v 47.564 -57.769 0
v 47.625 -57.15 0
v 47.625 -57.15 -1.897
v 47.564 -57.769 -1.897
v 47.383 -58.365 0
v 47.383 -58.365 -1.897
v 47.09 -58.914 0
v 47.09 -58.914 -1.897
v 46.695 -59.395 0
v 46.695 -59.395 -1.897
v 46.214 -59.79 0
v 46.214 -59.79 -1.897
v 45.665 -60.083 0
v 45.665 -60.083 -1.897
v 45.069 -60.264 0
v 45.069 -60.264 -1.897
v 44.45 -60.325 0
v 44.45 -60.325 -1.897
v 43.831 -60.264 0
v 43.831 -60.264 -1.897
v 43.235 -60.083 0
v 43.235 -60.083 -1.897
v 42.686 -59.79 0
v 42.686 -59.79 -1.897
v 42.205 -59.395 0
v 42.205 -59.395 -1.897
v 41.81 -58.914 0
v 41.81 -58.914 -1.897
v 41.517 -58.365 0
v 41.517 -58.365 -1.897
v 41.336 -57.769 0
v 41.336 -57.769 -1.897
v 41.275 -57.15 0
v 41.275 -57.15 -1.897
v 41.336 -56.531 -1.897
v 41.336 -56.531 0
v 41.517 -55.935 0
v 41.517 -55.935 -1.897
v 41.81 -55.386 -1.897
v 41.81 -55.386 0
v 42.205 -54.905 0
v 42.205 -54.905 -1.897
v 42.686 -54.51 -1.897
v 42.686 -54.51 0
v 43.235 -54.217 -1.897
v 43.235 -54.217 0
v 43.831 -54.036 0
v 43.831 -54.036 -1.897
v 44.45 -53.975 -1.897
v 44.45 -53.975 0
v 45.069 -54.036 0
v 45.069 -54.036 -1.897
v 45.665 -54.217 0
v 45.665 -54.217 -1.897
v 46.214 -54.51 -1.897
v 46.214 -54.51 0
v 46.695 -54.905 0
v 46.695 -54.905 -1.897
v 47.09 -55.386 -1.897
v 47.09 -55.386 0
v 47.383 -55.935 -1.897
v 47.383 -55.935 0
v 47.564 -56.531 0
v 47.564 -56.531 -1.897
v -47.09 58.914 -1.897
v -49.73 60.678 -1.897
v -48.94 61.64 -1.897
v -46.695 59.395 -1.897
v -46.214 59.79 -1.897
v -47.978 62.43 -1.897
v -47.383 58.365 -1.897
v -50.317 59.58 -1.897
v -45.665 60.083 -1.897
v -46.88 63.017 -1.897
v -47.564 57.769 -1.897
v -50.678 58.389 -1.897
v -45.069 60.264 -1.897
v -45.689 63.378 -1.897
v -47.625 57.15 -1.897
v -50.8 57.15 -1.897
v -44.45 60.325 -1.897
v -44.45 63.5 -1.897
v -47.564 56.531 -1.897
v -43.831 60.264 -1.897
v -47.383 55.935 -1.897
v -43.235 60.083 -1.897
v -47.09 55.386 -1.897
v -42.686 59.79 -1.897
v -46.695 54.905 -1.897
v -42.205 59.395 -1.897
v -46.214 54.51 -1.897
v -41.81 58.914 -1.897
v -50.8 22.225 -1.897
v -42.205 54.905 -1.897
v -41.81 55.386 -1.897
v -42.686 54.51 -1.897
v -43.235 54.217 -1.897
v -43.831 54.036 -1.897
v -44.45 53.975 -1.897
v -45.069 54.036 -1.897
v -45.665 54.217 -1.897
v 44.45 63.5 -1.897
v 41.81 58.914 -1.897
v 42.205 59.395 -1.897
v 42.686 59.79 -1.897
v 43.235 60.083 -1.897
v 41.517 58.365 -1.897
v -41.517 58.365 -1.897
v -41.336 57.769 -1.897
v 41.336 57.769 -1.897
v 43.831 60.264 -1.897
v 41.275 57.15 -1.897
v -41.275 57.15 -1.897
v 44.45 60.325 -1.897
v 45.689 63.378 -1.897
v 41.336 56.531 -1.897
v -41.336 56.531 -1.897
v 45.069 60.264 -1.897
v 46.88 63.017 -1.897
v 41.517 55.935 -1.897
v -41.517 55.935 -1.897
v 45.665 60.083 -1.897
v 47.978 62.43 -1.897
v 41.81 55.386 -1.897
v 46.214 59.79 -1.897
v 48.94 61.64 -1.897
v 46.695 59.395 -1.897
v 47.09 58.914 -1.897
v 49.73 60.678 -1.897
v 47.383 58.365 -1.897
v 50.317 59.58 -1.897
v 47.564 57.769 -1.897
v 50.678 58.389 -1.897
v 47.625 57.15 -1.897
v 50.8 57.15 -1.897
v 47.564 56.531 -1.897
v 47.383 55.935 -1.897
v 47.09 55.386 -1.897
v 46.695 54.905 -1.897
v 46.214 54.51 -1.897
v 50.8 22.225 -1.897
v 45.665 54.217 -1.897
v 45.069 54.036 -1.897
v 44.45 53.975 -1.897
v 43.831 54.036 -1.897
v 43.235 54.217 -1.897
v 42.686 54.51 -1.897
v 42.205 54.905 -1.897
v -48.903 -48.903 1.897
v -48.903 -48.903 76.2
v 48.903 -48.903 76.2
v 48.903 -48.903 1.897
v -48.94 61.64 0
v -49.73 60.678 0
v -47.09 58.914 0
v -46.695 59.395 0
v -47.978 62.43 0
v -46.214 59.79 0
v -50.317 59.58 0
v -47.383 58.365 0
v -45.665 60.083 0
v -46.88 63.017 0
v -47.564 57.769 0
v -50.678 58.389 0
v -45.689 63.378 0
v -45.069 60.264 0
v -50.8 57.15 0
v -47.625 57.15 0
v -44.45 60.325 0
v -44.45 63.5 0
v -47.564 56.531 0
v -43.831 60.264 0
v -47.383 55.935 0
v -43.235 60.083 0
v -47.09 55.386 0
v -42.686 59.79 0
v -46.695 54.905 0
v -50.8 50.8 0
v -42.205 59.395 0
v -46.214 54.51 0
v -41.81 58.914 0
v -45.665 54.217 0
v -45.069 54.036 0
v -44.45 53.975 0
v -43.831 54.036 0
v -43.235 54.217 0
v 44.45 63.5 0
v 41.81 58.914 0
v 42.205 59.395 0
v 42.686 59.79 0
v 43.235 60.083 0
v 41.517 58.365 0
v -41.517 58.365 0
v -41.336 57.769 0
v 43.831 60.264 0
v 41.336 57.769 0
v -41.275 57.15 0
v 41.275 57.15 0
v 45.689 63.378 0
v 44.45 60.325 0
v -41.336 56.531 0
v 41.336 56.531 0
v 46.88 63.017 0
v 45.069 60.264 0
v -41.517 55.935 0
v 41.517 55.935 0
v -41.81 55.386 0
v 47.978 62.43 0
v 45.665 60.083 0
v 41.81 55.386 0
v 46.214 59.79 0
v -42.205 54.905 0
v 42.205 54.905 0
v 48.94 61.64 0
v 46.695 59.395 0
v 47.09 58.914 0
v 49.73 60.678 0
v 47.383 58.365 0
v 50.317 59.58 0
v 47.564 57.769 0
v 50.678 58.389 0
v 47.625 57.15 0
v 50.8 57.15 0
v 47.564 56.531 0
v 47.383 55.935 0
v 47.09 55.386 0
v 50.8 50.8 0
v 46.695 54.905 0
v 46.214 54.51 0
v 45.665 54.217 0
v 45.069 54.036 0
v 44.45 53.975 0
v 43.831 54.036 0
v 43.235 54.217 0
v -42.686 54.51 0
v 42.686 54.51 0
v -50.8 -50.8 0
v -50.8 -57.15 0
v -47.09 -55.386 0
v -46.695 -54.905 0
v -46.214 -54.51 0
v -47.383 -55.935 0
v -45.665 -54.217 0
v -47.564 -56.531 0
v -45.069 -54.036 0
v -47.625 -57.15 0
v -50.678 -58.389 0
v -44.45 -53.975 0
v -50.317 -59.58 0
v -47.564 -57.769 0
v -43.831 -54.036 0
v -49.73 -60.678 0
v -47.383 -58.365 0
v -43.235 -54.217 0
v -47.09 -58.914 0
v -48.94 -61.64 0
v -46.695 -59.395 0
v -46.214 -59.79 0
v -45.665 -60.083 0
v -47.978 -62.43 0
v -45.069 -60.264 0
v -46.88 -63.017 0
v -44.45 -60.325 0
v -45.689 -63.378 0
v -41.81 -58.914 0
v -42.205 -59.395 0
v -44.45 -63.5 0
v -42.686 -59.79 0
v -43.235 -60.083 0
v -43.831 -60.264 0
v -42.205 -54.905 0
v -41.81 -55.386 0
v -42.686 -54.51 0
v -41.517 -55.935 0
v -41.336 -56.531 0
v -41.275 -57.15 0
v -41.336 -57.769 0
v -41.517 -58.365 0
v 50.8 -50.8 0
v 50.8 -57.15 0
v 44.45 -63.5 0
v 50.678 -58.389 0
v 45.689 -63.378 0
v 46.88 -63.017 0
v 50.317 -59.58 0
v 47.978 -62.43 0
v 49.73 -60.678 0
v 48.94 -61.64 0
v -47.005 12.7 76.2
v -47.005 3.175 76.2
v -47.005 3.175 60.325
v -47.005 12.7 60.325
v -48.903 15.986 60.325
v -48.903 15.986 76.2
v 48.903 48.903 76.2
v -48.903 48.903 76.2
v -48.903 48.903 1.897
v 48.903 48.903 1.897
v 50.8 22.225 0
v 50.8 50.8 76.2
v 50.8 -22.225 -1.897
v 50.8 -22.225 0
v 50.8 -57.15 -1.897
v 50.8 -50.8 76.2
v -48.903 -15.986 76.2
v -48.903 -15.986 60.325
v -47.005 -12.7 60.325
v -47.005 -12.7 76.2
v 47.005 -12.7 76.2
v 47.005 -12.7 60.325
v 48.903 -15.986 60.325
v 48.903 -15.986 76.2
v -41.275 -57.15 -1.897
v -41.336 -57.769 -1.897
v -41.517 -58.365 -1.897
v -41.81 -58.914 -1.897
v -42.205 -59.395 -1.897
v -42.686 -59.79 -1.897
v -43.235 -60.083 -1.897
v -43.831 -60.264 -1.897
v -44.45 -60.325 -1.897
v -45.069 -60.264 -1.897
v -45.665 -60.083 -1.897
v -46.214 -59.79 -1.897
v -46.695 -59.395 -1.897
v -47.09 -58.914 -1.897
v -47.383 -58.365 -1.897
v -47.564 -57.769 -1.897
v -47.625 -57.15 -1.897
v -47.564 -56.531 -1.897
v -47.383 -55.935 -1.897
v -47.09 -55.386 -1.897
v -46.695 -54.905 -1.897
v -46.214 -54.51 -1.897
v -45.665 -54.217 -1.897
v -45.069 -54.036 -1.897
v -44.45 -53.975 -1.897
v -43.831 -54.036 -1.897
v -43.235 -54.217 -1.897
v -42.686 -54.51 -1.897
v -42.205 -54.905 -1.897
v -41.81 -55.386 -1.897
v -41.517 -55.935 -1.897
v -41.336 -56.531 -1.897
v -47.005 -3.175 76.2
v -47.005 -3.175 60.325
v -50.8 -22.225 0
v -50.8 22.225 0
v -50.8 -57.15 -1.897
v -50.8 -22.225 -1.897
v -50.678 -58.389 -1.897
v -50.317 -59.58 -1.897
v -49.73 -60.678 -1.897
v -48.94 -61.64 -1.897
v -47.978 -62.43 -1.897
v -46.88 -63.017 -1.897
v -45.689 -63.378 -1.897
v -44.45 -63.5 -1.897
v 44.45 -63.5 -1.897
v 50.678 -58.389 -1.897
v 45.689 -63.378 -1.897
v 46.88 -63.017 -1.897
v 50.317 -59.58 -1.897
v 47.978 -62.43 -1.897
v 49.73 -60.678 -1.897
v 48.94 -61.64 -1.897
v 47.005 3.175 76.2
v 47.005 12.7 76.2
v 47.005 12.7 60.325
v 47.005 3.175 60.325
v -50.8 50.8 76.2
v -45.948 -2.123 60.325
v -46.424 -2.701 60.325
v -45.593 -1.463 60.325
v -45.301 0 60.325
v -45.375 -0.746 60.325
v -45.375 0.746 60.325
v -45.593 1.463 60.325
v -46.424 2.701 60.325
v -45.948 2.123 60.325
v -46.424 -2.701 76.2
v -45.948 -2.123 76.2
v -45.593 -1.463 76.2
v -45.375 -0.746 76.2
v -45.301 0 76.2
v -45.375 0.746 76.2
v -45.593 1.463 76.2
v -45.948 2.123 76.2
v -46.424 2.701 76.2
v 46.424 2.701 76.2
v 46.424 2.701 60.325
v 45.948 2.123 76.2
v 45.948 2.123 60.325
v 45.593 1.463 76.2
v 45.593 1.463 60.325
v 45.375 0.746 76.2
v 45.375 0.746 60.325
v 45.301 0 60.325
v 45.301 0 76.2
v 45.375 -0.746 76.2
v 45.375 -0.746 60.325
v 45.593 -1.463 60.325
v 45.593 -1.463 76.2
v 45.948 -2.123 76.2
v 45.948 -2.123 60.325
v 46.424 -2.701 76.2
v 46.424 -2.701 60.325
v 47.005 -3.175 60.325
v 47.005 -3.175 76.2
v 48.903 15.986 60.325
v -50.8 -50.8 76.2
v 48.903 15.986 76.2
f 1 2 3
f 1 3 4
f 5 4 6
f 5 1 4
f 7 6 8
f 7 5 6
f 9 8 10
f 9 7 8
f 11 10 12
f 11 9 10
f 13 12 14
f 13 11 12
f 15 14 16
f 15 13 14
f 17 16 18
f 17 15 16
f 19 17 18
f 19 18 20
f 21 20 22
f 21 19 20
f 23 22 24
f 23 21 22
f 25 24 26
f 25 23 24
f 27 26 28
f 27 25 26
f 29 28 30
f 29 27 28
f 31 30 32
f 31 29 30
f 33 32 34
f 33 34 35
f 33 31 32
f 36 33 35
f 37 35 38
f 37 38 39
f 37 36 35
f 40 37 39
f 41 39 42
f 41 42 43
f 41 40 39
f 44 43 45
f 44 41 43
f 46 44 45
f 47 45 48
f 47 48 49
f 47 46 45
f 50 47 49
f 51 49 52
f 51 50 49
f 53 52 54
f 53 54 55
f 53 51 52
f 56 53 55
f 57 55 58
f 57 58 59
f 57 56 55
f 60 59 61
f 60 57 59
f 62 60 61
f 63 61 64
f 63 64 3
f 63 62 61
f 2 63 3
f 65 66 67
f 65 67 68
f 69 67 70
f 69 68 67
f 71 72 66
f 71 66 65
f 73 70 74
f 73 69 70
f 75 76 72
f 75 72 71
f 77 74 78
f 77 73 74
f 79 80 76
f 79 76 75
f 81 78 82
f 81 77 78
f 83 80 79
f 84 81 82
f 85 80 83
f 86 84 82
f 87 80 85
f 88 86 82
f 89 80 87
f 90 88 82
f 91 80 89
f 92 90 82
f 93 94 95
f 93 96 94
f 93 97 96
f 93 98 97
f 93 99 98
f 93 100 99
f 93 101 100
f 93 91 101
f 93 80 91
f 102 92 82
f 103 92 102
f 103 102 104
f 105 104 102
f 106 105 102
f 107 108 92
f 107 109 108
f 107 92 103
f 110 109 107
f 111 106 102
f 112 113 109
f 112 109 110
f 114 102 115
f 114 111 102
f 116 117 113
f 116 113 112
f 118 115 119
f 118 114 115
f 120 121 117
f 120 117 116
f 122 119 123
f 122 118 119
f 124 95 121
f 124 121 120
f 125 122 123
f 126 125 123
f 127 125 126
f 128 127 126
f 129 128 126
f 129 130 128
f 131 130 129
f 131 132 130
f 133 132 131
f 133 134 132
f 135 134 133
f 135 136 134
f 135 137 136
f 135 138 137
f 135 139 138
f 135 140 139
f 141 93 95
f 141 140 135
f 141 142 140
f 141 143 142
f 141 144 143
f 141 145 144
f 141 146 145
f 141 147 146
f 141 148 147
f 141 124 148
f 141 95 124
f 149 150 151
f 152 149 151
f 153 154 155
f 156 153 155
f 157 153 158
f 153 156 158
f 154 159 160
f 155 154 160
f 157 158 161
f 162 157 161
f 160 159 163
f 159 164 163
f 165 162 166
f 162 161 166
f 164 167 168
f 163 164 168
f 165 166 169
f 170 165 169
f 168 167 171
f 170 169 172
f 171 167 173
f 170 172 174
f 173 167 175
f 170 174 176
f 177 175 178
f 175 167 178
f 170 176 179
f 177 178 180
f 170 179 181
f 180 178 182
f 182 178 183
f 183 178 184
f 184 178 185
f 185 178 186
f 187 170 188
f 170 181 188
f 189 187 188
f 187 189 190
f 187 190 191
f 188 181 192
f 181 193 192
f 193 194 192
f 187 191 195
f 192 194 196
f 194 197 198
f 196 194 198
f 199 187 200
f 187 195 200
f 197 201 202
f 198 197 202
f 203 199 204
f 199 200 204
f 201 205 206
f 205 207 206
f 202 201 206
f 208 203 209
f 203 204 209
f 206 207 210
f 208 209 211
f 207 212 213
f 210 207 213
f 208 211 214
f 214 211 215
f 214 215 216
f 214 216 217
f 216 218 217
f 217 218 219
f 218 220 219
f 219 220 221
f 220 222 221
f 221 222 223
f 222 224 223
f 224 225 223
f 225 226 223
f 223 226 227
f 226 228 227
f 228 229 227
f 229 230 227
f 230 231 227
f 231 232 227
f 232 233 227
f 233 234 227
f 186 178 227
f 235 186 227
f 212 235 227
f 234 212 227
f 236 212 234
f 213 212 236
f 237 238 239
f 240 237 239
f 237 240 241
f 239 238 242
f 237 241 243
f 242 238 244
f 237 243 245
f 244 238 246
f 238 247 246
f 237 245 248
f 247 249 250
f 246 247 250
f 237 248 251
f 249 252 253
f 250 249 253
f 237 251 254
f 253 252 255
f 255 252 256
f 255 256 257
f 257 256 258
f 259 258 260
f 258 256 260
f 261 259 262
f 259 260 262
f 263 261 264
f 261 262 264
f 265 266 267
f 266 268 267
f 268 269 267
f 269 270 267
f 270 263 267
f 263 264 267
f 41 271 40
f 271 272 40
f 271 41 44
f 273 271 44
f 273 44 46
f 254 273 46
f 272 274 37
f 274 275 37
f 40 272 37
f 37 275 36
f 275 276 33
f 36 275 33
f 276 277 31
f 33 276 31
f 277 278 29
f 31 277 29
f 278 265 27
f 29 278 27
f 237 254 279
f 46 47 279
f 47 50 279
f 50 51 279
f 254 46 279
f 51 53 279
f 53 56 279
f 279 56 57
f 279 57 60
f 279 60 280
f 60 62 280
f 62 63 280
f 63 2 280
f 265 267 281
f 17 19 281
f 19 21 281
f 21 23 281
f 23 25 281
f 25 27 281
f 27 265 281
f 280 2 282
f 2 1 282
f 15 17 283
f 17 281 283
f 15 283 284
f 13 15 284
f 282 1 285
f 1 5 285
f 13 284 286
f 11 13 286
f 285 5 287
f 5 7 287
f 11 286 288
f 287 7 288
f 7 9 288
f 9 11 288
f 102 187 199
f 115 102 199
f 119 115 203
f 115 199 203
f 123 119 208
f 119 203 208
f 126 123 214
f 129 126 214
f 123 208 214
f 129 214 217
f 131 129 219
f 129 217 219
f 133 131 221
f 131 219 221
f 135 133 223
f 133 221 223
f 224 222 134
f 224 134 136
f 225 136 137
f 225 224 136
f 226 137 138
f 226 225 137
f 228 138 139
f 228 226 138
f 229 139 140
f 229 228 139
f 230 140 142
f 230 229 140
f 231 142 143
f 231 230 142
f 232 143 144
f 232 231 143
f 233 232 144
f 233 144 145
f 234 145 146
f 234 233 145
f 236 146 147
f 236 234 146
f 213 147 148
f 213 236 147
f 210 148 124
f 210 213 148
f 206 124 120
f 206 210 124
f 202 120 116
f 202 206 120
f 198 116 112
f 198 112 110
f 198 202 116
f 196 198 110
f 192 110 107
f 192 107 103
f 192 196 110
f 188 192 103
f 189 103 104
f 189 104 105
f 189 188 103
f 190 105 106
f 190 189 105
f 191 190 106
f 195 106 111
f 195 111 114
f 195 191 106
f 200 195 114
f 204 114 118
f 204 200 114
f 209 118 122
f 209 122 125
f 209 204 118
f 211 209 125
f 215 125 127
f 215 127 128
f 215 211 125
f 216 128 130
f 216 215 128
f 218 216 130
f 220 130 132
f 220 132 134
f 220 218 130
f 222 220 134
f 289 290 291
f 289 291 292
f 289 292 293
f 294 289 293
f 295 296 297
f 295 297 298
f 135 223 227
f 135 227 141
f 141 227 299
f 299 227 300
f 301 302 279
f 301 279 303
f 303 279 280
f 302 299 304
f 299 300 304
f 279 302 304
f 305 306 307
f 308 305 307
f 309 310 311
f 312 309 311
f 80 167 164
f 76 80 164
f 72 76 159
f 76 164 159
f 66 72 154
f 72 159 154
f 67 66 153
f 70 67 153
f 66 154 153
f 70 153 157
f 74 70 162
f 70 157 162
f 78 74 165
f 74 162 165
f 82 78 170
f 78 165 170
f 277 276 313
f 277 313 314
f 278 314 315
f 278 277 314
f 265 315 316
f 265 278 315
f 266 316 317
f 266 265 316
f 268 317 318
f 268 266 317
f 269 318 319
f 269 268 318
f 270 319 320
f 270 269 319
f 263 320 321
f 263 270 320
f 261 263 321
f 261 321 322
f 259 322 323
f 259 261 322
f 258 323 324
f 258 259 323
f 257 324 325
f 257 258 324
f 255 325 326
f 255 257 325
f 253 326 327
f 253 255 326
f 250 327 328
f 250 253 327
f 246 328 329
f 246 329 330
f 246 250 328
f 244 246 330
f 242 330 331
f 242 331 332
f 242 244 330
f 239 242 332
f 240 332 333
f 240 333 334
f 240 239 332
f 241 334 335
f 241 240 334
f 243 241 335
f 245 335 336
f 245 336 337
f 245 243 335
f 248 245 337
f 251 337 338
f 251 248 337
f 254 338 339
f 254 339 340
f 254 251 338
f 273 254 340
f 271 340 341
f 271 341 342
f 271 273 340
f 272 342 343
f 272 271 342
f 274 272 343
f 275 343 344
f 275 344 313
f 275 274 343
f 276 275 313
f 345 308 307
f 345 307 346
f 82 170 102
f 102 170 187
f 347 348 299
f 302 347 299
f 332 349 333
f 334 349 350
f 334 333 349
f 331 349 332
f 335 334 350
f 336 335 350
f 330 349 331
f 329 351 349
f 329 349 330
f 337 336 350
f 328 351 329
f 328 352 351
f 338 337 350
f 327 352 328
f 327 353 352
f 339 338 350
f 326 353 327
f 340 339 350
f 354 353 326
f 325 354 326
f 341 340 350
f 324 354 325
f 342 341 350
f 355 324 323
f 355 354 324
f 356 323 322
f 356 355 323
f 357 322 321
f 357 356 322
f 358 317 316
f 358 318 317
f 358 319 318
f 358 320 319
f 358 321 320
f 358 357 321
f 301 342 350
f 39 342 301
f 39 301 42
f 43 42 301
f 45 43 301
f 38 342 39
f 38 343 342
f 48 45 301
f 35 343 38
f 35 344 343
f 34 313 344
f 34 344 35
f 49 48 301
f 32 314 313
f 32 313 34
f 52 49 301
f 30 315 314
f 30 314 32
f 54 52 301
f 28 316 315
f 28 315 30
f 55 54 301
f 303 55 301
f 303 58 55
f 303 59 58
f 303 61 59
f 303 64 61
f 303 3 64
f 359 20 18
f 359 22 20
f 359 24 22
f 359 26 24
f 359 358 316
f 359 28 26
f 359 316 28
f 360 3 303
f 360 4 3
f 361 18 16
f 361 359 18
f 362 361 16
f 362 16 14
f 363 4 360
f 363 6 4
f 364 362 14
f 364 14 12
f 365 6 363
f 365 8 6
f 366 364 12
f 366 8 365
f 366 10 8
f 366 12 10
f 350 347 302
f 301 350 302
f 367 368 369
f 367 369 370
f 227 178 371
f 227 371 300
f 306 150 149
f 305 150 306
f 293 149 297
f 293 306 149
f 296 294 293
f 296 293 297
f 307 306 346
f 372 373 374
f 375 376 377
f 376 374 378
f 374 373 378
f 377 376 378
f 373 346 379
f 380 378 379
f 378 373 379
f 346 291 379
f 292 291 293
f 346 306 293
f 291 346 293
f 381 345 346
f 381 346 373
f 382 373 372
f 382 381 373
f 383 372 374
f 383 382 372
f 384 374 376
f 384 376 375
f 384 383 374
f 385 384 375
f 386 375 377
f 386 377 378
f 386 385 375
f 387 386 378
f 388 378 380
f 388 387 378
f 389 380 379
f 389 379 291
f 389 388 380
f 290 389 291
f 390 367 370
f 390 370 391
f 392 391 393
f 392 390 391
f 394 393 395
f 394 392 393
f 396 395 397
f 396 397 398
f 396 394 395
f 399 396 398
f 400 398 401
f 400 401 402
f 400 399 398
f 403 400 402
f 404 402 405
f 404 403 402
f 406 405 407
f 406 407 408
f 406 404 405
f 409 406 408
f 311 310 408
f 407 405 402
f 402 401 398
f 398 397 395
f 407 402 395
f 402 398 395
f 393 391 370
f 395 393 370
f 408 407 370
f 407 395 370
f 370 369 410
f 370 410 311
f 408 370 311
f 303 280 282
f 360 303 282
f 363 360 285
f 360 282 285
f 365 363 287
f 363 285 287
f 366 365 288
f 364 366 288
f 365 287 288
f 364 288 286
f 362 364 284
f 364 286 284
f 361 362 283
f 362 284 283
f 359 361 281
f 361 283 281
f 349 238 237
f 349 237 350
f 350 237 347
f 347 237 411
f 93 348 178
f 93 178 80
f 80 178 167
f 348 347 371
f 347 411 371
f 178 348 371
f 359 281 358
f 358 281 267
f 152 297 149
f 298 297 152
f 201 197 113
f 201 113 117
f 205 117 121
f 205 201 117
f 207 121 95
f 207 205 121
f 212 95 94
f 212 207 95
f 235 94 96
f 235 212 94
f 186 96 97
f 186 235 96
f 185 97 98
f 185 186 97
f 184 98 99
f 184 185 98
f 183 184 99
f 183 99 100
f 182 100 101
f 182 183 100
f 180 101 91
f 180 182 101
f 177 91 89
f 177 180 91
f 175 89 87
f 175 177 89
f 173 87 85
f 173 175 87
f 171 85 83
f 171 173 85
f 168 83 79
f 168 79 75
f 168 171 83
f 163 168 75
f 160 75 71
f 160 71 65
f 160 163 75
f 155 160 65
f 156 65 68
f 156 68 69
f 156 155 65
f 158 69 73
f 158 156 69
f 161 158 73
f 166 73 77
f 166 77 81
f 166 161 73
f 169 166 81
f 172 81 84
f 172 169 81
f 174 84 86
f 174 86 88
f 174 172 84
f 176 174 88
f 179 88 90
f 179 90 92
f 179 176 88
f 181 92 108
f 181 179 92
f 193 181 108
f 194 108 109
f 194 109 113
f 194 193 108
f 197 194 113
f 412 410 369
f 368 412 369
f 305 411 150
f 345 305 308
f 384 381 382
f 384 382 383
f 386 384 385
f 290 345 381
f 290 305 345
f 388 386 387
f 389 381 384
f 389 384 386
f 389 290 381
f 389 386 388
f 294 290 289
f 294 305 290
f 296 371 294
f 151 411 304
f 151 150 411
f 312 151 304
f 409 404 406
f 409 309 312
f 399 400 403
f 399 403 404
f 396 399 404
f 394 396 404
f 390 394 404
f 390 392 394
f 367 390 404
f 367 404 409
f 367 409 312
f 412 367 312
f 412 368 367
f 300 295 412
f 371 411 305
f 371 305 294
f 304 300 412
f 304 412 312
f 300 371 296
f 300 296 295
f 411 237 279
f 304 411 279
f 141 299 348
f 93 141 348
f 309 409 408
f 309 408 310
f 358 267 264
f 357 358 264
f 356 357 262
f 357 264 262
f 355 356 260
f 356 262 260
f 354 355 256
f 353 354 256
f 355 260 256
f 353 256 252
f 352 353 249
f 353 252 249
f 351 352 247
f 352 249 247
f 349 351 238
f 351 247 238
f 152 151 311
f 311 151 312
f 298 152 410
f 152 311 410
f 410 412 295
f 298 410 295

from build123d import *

# Parameters (mm, degrees)
F0_W     = 101.6
F0_H     = 101.6
F1_DEPTH = 76.2
F2_W     = 97.80524
F2_H     = 97.80524
F3_DEPTH = 74.30262
F5_DEPTH = 15.875
F6_R     = 3.175
F7_DEPTH = 1.89738


with BuildPart() as f1:
    # F0 (on Top) → F1 (new body)
    with BuildSketch(Plane.XY):
        Rectangle(F0_W, F0_H)
    extrude(amount=F1_DEPTH)

    # F2 (on face) → F3 (cut)
    with BuildSketch(Plane.XY.offset(76.2)):
        Rectangle(F2_W, F2_H)
    extrude(amount=-F3_DEPTH, mode=Mode.SUBTRACT)

    # F4 (on face) → F5 (join)
    with BuildSketch(Plane.XY.offset(76.2)):
        with BuildLine():
            Line((-47.00524, 12.7), (-48.90262, 15.986359))
            Line((-48.90262, 15.986359), (-48.90262, -15.986359))
            Line((-48.90262, -15.986359), (-47.00524, -12.7))
            Line((-47.00524, -12.7), (-47.00524, -3.175))
            ThreePointArc((-47.00524, -3.175), (-45.301297, 0), (-47.00524, 3.175))
            Line((-47.00524, 3.175), (-47.00524, 12.7))
        make_face()
        with BuildLine():
            Line((48.90262, -15.986359), (48.90262, 15.986359))
            Line((48.90262, 15.986359), (47.00524, 12.7))
            Line((47.00524, 12.7), (47.00524, 3.175))
            ThreePointArc((47.00524, 3.175), (45.301297, 0), (47.00524, -3.175))
            Line((47.00524, -3.175), (47.00524, -12.7))
            Line((47.00524, -12.7), (48.90262, -15.986359))
        make_face()
    extrude(amount=-F5_DEPTH)

    # F6 (on face) → F7 (join)
    with BuildSketch(Plane(origin=(0, 0, 0), x_dir=(1, 0, 0), z_dir=(0, 0, -1))):
        with BuildLine():
            Line((-50.8, 57.15), (-50.8, 22.225))
            Line((-50.8, 22.225), (50.8, 22.225))
            Line((50.8, 22.225), (50.8, 57.15))
            ThreePointArc((50.8, 57.15), (48.940128, 61.640128), (44.45, 63.5))
            Line((44.45, 63.5), (-44.45, 63.5))
            ThreePointArc((-44.45, 63.5), (-48.940128, 61.640128), (-50.8, 57.15))
        make_face()
        with Locations((-44.45, 57.15)):
            Circle(F6_R, mode=Mode.SUBTRACT)
        with Locations((44.45, 57.15)):
            Circle(F6_R, mode=Mode.SUBTRACT)
        with BuildLine():
            Line((50.8, -22.225), (-50.8, -22.225))
            Line((-50.8, -22.225), (-50.8, -57.15))
            ThreePointArc((-50.8, -57.15), (-48.940128, -61.640128), (-44.45, -63.5))
            Line((-44.45, -63.5), (44.45, -63.5))
            ThreePointArc((44.45, -63.5), (48.940128, -61.640128), (50.8, -57.15))
            Line((50.8, -57.15), (50.8, -22.225))
        make_face()
        with Locations((-44.45, -57.15)):
            Circle(F6_R, mode=Mode.SUBTRACT)
        with Locations((44.45, -57.15)):
            Circle(F6_R, mode=Mode.SUBTRACT)
    extrude(amount=F7_DEPTH)


solid = f1.part
